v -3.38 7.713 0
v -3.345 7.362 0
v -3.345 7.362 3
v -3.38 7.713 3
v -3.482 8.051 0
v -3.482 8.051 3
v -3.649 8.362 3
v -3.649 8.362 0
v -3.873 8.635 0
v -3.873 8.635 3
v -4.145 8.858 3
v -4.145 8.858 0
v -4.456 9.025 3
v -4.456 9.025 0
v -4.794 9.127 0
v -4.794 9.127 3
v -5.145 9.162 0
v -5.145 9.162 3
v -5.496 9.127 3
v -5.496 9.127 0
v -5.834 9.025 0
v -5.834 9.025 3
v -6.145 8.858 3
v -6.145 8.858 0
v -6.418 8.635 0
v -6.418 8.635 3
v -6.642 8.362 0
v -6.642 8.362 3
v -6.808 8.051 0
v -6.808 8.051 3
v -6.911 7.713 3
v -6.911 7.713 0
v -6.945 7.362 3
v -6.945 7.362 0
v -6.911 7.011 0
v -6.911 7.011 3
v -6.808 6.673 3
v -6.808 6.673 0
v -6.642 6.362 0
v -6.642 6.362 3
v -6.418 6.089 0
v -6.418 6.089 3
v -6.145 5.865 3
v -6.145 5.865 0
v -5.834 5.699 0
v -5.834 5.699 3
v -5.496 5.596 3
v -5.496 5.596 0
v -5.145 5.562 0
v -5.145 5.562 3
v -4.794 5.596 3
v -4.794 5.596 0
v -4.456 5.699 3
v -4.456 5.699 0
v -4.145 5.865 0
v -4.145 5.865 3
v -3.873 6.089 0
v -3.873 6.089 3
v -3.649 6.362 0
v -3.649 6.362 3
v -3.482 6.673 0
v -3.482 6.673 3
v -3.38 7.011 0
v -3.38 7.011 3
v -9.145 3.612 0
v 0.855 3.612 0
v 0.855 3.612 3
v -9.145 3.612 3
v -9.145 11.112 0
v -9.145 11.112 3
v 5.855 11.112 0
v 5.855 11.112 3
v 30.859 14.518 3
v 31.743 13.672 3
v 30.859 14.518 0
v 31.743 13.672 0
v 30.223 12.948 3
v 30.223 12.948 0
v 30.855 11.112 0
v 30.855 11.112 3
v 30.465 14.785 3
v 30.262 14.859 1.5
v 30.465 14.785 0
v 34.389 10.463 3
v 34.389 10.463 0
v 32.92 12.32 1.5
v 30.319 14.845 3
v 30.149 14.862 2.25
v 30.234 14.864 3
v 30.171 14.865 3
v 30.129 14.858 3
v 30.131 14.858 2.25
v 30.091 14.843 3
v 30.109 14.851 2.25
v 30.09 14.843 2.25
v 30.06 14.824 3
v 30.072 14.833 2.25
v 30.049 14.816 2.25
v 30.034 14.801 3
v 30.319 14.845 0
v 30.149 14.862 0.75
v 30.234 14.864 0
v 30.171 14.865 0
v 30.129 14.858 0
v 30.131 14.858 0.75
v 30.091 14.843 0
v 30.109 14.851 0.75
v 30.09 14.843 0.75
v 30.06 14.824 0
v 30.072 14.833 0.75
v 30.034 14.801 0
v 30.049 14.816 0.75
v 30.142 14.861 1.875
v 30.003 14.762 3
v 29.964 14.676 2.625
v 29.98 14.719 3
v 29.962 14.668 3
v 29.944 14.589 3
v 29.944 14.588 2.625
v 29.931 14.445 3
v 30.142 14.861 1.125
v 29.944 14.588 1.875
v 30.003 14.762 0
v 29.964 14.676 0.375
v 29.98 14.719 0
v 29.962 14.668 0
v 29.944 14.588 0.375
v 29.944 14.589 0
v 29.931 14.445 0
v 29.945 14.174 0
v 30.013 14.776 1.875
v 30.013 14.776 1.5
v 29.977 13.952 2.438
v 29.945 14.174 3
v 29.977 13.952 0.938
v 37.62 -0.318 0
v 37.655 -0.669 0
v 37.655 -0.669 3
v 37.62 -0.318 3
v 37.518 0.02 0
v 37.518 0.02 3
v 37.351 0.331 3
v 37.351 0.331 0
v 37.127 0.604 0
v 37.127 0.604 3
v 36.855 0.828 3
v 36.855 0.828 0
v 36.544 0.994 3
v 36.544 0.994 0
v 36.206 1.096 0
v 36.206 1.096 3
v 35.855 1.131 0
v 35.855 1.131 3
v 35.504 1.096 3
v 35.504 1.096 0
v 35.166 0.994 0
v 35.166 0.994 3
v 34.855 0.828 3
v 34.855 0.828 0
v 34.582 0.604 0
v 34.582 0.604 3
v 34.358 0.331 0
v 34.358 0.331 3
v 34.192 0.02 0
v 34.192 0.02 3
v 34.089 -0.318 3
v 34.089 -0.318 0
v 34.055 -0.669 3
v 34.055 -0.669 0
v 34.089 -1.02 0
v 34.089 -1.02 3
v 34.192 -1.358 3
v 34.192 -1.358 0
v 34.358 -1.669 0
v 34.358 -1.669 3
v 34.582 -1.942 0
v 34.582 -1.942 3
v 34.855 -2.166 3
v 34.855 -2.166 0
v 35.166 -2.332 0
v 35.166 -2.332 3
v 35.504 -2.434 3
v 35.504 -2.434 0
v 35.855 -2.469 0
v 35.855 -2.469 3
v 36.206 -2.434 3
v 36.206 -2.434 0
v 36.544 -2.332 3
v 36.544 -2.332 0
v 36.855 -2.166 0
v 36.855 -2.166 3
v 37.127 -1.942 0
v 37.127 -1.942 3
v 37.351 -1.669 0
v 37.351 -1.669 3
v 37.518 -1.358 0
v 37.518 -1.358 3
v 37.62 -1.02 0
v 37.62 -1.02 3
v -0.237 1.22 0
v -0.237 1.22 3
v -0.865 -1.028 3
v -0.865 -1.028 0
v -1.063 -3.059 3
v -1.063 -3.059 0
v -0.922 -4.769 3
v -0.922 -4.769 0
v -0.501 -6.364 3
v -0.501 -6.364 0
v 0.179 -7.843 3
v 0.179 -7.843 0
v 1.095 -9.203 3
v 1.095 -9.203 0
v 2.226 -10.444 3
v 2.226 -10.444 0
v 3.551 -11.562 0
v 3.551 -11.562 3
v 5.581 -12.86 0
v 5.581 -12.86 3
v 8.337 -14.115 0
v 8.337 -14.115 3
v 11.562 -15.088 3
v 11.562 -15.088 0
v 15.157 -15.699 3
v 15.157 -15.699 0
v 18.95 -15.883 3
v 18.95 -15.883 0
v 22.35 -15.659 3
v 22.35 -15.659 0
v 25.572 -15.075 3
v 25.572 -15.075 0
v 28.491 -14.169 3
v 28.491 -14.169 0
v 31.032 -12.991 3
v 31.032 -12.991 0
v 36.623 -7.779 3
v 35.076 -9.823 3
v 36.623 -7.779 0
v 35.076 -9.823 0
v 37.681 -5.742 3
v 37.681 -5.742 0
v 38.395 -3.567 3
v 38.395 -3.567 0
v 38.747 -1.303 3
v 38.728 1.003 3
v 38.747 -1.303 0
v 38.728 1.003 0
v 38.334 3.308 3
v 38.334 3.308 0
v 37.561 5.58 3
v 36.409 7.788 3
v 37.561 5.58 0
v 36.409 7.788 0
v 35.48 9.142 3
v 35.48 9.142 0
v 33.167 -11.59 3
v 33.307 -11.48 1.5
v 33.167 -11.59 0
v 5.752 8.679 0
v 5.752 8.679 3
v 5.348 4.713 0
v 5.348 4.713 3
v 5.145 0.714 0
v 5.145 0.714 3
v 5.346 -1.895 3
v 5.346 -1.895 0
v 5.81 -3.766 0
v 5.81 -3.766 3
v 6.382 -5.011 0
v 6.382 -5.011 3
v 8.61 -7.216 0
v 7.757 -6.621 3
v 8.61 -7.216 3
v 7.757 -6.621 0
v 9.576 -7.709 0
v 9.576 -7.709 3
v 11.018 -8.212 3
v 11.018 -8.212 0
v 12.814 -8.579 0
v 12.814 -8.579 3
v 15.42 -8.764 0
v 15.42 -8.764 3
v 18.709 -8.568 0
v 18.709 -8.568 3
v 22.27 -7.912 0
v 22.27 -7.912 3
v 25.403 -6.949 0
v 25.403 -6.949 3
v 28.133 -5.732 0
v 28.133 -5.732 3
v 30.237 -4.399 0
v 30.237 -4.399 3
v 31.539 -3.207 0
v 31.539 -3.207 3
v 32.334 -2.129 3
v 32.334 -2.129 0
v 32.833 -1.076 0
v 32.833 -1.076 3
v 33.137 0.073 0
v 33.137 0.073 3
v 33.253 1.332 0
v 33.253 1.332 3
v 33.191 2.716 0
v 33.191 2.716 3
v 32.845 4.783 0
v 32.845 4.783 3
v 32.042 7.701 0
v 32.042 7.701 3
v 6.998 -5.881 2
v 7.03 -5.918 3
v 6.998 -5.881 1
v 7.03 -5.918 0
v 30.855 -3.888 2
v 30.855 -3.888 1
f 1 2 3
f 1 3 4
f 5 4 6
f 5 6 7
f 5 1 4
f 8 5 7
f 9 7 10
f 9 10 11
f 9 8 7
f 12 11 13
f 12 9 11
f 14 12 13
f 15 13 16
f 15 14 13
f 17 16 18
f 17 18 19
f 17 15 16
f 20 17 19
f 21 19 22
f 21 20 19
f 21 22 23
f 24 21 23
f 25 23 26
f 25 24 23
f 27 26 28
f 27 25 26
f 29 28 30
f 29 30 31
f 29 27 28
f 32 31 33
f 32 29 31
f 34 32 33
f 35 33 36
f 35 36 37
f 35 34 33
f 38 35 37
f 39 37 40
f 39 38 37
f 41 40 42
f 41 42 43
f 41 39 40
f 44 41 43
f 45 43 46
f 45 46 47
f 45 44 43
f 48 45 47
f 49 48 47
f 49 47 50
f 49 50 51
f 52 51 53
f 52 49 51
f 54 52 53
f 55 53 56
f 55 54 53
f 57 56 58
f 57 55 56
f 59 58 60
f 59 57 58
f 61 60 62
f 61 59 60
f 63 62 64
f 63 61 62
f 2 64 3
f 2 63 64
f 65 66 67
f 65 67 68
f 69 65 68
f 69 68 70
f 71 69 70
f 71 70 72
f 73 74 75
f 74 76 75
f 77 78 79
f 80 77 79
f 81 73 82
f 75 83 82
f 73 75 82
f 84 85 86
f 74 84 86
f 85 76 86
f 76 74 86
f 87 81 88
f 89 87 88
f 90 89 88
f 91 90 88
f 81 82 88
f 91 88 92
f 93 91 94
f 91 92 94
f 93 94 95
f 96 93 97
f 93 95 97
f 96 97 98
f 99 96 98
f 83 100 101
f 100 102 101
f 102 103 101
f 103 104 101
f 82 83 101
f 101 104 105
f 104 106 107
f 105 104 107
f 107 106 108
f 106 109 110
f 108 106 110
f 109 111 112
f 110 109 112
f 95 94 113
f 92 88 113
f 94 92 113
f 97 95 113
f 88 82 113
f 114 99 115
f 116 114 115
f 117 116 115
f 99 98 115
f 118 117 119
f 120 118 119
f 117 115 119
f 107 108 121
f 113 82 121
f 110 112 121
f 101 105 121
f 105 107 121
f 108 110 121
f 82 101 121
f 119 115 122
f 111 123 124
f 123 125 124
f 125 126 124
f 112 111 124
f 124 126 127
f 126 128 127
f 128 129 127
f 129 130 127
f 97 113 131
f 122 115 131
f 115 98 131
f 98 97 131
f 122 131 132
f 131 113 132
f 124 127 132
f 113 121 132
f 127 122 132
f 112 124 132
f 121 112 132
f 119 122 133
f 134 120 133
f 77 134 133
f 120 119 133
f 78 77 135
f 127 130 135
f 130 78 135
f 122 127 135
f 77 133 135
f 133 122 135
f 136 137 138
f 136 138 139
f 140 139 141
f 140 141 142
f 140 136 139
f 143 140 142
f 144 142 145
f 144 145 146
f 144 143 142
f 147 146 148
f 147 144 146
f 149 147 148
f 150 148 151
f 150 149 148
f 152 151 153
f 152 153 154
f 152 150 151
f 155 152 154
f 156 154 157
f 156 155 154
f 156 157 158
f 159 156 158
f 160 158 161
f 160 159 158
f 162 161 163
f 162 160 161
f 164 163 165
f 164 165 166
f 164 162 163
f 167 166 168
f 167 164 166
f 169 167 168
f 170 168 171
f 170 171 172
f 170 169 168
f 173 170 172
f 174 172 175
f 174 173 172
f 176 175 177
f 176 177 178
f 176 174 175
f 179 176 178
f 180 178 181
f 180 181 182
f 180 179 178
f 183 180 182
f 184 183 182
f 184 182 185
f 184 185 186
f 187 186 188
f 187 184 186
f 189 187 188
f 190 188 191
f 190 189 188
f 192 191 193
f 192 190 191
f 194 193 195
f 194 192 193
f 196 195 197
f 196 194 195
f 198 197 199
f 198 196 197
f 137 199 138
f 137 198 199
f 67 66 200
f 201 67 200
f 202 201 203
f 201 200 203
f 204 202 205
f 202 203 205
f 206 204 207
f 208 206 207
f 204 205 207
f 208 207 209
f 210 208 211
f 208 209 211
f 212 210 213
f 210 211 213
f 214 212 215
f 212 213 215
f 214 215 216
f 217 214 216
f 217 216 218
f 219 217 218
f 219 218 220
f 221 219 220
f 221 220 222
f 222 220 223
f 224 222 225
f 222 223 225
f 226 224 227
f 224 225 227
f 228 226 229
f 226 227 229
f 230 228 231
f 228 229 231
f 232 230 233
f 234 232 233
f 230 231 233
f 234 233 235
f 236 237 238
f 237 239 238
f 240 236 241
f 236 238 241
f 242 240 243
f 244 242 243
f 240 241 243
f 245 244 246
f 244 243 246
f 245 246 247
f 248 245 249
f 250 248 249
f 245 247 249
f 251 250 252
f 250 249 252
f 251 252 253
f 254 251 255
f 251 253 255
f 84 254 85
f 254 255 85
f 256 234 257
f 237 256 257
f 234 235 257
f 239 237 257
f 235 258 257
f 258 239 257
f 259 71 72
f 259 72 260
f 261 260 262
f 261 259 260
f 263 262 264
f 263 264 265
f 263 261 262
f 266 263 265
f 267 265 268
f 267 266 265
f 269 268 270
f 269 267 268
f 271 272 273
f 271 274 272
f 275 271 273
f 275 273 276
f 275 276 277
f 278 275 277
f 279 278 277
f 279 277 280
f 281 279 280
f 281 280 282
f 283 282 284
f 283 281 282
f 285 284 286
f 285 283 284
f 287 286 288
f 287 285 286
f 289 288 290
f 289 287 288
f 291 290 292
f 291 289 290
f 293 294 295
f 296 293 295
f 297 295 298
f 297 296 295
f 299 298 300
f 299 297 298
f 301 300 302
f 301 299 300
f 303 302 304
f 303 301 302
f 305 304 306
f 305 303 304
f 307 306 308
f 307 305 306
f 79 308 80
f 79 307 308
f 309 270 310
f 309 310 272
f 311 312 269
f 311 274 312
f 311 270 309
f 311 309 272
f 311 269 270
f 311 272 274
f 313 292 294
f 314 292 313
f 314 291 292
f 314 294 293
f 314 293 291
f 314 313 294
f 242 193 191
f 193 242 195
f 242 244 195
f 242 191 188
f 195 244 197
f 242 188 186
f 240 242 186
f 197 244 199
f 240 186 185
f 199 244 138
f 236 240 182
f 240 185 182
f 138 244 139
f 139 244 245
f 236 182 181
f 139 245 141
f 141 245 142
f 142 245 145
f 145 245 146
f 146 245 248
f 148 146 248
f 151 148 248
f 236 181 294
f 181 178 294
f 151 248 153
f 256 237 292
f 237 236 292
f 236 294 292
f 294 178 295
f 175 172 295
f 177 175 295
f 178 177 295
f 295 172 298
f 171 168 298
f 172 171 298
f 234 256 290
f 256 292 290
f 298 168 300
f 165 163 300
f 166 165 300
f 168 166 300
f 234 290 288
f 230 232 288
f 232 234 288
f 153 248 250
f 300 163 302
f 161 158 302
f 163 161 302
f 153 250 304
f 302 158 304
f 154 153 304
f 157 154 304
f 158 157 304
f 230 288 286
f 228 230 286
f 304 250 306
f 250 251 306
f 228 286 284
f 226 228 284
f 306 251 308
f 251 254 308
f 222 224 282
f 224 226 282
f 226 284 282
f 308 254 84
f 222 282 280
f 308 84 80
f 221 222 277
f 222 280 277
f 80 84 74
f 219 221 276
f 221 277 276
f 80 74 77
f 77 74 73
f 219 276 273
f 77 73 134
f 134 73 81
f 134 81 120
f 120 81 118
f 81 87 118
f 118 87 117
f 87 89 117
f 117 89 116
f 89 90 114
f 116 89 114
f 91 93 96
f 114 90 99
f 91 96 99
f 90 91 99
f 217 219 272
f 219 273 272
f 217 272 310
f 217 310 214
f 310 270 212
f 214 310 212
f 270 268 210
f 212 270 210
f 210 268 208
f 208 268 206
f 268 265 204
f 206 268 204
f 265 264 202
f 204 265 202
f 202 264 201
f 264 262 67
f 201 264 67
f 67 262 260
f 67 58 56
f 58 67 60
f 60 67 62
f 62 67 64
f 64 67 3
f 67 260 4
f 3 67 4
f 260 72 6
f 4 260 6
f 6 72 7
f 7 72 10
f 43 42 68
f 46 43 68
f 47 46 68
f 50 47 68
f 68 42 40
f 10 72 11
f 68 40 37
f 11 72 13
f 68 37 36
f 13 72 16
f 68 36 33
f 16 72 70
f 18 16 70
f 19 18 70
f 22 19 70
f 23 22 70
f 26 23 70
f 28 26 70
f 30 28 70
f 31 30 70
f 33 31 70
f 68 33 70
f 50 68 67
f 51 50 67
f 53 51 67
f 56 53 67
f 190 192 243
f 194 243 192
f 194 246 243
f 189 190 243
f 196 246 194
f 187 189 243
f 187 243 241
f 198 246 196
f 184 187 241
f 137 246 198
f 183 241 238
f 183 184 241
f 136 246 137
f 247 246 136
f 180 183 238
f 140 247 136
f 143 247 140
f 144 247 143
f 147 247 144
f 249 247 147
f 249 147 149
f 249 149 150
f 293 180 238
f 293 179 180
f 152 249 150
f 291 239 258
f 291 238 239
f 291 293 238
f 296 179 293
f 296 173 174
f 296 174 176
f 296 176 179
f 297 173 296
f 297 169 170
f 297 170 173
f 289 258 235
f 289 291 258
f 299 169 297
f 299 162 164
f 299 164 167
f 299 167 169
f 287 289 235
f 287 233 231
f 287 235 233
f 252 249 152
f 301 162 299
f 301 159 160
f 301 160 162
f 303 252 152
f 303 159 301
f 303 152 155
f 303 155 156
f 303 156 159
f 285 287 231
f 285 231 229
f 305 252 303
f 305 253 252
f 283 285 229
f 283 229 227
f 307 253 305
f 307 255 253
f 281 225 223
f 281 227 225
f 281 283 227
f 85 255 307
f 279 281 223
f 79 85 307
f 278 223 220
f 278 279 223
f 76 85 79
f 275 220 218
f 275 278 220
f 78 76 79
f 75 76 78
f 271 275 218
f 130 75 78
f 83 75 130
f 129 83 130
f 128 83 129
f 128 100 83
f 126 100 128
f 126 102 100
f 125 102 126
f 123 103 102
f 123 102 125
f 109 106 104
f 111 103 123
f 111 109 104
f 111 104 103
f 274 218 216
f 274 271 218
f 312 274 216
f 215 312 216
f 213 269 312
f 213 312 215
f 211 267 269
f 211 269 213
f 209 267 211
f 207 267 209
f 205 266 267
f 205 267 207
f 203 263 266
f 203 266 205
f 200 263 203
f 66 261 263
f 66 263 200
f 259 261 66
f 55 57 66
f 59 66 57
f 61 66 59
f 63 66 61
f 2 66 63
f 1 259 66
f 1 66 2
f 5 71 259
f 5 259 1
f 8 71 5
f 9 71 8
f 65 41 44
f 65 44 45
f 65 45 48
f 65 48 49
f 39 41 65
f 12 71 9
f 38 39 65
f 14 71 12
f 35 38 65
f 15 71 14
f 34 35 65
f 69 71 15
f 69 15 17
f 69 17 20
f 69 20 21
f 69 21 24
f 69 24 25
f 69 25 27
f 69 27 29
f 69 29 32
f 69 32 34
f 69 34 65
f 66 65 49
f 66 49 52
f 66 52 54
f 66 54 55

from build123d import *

# Parameters (mm, degrees)
ESQUISSE1_R        = 1.8
BOSS_EXTRU_1_DEPTH = 3


with BuildPart() as part:
    # Esquisse1 → Boss.-Extru.1 (new body)
    with BuildSketch(Plane.XY):
        with BuildLine():
            Line((-9.145330081, 11.111719912), (0.854669919, 11.111719912))
            Line((0.854669919, 11.111719912), (5.854669919, 11.111719912))
            add(Edge.make_bspline(
                [(5.854669919, 11.111719912), (6.001733277, 6.888329486), (0.382726488, -13.057760188), (35.133210567, -6.83799381), (33.778825155, 3.240433108), (30.854669919, 11.111719912)],
                knots=[0, 0, 0, 0, 0.318181818, 0.727272727, 1, 1, 1, 1], degree=3))
            add(Edge.make_bspline(
                [(34.389441517, 10.463206131), (27.90161821, 18.931491829), (30.854669919, 11.111719912)],
                knots=[0, 0, 0, 1, 1, 1], degree=2))
            add(Edge.make_bspline(
                [(0.854669919, 3.611719912), (-8.904641883, -14.392277313), (36.805178859, -24.645827474), (41.104982554, 3.016776947), (34.389441517, 10.463206131)],
                knots=[0, 0, 0, 0, 0.657630446, 1, 1, 1, 1], degree=3))
            Line((0.854669919, 3.611719912), (-9.145330081, 3.611719912))
            Line((-9.145330081, 3.611719912), (-9.145330081, 11.111719912))
        make_face()
        with Locations((-5.145330081, 7.361719912)):
            Circle(ESQUISSE1_R, mode=Mode.SUBTRACT)
        with Locations((35.854669919, -0.66900557)):
            Circle(ESQUISSE1_R, mode=Mode.SUBTRACT)
    extrude(amount=BOSS_EXTRU_1_DEPTH)


solid = part.part
